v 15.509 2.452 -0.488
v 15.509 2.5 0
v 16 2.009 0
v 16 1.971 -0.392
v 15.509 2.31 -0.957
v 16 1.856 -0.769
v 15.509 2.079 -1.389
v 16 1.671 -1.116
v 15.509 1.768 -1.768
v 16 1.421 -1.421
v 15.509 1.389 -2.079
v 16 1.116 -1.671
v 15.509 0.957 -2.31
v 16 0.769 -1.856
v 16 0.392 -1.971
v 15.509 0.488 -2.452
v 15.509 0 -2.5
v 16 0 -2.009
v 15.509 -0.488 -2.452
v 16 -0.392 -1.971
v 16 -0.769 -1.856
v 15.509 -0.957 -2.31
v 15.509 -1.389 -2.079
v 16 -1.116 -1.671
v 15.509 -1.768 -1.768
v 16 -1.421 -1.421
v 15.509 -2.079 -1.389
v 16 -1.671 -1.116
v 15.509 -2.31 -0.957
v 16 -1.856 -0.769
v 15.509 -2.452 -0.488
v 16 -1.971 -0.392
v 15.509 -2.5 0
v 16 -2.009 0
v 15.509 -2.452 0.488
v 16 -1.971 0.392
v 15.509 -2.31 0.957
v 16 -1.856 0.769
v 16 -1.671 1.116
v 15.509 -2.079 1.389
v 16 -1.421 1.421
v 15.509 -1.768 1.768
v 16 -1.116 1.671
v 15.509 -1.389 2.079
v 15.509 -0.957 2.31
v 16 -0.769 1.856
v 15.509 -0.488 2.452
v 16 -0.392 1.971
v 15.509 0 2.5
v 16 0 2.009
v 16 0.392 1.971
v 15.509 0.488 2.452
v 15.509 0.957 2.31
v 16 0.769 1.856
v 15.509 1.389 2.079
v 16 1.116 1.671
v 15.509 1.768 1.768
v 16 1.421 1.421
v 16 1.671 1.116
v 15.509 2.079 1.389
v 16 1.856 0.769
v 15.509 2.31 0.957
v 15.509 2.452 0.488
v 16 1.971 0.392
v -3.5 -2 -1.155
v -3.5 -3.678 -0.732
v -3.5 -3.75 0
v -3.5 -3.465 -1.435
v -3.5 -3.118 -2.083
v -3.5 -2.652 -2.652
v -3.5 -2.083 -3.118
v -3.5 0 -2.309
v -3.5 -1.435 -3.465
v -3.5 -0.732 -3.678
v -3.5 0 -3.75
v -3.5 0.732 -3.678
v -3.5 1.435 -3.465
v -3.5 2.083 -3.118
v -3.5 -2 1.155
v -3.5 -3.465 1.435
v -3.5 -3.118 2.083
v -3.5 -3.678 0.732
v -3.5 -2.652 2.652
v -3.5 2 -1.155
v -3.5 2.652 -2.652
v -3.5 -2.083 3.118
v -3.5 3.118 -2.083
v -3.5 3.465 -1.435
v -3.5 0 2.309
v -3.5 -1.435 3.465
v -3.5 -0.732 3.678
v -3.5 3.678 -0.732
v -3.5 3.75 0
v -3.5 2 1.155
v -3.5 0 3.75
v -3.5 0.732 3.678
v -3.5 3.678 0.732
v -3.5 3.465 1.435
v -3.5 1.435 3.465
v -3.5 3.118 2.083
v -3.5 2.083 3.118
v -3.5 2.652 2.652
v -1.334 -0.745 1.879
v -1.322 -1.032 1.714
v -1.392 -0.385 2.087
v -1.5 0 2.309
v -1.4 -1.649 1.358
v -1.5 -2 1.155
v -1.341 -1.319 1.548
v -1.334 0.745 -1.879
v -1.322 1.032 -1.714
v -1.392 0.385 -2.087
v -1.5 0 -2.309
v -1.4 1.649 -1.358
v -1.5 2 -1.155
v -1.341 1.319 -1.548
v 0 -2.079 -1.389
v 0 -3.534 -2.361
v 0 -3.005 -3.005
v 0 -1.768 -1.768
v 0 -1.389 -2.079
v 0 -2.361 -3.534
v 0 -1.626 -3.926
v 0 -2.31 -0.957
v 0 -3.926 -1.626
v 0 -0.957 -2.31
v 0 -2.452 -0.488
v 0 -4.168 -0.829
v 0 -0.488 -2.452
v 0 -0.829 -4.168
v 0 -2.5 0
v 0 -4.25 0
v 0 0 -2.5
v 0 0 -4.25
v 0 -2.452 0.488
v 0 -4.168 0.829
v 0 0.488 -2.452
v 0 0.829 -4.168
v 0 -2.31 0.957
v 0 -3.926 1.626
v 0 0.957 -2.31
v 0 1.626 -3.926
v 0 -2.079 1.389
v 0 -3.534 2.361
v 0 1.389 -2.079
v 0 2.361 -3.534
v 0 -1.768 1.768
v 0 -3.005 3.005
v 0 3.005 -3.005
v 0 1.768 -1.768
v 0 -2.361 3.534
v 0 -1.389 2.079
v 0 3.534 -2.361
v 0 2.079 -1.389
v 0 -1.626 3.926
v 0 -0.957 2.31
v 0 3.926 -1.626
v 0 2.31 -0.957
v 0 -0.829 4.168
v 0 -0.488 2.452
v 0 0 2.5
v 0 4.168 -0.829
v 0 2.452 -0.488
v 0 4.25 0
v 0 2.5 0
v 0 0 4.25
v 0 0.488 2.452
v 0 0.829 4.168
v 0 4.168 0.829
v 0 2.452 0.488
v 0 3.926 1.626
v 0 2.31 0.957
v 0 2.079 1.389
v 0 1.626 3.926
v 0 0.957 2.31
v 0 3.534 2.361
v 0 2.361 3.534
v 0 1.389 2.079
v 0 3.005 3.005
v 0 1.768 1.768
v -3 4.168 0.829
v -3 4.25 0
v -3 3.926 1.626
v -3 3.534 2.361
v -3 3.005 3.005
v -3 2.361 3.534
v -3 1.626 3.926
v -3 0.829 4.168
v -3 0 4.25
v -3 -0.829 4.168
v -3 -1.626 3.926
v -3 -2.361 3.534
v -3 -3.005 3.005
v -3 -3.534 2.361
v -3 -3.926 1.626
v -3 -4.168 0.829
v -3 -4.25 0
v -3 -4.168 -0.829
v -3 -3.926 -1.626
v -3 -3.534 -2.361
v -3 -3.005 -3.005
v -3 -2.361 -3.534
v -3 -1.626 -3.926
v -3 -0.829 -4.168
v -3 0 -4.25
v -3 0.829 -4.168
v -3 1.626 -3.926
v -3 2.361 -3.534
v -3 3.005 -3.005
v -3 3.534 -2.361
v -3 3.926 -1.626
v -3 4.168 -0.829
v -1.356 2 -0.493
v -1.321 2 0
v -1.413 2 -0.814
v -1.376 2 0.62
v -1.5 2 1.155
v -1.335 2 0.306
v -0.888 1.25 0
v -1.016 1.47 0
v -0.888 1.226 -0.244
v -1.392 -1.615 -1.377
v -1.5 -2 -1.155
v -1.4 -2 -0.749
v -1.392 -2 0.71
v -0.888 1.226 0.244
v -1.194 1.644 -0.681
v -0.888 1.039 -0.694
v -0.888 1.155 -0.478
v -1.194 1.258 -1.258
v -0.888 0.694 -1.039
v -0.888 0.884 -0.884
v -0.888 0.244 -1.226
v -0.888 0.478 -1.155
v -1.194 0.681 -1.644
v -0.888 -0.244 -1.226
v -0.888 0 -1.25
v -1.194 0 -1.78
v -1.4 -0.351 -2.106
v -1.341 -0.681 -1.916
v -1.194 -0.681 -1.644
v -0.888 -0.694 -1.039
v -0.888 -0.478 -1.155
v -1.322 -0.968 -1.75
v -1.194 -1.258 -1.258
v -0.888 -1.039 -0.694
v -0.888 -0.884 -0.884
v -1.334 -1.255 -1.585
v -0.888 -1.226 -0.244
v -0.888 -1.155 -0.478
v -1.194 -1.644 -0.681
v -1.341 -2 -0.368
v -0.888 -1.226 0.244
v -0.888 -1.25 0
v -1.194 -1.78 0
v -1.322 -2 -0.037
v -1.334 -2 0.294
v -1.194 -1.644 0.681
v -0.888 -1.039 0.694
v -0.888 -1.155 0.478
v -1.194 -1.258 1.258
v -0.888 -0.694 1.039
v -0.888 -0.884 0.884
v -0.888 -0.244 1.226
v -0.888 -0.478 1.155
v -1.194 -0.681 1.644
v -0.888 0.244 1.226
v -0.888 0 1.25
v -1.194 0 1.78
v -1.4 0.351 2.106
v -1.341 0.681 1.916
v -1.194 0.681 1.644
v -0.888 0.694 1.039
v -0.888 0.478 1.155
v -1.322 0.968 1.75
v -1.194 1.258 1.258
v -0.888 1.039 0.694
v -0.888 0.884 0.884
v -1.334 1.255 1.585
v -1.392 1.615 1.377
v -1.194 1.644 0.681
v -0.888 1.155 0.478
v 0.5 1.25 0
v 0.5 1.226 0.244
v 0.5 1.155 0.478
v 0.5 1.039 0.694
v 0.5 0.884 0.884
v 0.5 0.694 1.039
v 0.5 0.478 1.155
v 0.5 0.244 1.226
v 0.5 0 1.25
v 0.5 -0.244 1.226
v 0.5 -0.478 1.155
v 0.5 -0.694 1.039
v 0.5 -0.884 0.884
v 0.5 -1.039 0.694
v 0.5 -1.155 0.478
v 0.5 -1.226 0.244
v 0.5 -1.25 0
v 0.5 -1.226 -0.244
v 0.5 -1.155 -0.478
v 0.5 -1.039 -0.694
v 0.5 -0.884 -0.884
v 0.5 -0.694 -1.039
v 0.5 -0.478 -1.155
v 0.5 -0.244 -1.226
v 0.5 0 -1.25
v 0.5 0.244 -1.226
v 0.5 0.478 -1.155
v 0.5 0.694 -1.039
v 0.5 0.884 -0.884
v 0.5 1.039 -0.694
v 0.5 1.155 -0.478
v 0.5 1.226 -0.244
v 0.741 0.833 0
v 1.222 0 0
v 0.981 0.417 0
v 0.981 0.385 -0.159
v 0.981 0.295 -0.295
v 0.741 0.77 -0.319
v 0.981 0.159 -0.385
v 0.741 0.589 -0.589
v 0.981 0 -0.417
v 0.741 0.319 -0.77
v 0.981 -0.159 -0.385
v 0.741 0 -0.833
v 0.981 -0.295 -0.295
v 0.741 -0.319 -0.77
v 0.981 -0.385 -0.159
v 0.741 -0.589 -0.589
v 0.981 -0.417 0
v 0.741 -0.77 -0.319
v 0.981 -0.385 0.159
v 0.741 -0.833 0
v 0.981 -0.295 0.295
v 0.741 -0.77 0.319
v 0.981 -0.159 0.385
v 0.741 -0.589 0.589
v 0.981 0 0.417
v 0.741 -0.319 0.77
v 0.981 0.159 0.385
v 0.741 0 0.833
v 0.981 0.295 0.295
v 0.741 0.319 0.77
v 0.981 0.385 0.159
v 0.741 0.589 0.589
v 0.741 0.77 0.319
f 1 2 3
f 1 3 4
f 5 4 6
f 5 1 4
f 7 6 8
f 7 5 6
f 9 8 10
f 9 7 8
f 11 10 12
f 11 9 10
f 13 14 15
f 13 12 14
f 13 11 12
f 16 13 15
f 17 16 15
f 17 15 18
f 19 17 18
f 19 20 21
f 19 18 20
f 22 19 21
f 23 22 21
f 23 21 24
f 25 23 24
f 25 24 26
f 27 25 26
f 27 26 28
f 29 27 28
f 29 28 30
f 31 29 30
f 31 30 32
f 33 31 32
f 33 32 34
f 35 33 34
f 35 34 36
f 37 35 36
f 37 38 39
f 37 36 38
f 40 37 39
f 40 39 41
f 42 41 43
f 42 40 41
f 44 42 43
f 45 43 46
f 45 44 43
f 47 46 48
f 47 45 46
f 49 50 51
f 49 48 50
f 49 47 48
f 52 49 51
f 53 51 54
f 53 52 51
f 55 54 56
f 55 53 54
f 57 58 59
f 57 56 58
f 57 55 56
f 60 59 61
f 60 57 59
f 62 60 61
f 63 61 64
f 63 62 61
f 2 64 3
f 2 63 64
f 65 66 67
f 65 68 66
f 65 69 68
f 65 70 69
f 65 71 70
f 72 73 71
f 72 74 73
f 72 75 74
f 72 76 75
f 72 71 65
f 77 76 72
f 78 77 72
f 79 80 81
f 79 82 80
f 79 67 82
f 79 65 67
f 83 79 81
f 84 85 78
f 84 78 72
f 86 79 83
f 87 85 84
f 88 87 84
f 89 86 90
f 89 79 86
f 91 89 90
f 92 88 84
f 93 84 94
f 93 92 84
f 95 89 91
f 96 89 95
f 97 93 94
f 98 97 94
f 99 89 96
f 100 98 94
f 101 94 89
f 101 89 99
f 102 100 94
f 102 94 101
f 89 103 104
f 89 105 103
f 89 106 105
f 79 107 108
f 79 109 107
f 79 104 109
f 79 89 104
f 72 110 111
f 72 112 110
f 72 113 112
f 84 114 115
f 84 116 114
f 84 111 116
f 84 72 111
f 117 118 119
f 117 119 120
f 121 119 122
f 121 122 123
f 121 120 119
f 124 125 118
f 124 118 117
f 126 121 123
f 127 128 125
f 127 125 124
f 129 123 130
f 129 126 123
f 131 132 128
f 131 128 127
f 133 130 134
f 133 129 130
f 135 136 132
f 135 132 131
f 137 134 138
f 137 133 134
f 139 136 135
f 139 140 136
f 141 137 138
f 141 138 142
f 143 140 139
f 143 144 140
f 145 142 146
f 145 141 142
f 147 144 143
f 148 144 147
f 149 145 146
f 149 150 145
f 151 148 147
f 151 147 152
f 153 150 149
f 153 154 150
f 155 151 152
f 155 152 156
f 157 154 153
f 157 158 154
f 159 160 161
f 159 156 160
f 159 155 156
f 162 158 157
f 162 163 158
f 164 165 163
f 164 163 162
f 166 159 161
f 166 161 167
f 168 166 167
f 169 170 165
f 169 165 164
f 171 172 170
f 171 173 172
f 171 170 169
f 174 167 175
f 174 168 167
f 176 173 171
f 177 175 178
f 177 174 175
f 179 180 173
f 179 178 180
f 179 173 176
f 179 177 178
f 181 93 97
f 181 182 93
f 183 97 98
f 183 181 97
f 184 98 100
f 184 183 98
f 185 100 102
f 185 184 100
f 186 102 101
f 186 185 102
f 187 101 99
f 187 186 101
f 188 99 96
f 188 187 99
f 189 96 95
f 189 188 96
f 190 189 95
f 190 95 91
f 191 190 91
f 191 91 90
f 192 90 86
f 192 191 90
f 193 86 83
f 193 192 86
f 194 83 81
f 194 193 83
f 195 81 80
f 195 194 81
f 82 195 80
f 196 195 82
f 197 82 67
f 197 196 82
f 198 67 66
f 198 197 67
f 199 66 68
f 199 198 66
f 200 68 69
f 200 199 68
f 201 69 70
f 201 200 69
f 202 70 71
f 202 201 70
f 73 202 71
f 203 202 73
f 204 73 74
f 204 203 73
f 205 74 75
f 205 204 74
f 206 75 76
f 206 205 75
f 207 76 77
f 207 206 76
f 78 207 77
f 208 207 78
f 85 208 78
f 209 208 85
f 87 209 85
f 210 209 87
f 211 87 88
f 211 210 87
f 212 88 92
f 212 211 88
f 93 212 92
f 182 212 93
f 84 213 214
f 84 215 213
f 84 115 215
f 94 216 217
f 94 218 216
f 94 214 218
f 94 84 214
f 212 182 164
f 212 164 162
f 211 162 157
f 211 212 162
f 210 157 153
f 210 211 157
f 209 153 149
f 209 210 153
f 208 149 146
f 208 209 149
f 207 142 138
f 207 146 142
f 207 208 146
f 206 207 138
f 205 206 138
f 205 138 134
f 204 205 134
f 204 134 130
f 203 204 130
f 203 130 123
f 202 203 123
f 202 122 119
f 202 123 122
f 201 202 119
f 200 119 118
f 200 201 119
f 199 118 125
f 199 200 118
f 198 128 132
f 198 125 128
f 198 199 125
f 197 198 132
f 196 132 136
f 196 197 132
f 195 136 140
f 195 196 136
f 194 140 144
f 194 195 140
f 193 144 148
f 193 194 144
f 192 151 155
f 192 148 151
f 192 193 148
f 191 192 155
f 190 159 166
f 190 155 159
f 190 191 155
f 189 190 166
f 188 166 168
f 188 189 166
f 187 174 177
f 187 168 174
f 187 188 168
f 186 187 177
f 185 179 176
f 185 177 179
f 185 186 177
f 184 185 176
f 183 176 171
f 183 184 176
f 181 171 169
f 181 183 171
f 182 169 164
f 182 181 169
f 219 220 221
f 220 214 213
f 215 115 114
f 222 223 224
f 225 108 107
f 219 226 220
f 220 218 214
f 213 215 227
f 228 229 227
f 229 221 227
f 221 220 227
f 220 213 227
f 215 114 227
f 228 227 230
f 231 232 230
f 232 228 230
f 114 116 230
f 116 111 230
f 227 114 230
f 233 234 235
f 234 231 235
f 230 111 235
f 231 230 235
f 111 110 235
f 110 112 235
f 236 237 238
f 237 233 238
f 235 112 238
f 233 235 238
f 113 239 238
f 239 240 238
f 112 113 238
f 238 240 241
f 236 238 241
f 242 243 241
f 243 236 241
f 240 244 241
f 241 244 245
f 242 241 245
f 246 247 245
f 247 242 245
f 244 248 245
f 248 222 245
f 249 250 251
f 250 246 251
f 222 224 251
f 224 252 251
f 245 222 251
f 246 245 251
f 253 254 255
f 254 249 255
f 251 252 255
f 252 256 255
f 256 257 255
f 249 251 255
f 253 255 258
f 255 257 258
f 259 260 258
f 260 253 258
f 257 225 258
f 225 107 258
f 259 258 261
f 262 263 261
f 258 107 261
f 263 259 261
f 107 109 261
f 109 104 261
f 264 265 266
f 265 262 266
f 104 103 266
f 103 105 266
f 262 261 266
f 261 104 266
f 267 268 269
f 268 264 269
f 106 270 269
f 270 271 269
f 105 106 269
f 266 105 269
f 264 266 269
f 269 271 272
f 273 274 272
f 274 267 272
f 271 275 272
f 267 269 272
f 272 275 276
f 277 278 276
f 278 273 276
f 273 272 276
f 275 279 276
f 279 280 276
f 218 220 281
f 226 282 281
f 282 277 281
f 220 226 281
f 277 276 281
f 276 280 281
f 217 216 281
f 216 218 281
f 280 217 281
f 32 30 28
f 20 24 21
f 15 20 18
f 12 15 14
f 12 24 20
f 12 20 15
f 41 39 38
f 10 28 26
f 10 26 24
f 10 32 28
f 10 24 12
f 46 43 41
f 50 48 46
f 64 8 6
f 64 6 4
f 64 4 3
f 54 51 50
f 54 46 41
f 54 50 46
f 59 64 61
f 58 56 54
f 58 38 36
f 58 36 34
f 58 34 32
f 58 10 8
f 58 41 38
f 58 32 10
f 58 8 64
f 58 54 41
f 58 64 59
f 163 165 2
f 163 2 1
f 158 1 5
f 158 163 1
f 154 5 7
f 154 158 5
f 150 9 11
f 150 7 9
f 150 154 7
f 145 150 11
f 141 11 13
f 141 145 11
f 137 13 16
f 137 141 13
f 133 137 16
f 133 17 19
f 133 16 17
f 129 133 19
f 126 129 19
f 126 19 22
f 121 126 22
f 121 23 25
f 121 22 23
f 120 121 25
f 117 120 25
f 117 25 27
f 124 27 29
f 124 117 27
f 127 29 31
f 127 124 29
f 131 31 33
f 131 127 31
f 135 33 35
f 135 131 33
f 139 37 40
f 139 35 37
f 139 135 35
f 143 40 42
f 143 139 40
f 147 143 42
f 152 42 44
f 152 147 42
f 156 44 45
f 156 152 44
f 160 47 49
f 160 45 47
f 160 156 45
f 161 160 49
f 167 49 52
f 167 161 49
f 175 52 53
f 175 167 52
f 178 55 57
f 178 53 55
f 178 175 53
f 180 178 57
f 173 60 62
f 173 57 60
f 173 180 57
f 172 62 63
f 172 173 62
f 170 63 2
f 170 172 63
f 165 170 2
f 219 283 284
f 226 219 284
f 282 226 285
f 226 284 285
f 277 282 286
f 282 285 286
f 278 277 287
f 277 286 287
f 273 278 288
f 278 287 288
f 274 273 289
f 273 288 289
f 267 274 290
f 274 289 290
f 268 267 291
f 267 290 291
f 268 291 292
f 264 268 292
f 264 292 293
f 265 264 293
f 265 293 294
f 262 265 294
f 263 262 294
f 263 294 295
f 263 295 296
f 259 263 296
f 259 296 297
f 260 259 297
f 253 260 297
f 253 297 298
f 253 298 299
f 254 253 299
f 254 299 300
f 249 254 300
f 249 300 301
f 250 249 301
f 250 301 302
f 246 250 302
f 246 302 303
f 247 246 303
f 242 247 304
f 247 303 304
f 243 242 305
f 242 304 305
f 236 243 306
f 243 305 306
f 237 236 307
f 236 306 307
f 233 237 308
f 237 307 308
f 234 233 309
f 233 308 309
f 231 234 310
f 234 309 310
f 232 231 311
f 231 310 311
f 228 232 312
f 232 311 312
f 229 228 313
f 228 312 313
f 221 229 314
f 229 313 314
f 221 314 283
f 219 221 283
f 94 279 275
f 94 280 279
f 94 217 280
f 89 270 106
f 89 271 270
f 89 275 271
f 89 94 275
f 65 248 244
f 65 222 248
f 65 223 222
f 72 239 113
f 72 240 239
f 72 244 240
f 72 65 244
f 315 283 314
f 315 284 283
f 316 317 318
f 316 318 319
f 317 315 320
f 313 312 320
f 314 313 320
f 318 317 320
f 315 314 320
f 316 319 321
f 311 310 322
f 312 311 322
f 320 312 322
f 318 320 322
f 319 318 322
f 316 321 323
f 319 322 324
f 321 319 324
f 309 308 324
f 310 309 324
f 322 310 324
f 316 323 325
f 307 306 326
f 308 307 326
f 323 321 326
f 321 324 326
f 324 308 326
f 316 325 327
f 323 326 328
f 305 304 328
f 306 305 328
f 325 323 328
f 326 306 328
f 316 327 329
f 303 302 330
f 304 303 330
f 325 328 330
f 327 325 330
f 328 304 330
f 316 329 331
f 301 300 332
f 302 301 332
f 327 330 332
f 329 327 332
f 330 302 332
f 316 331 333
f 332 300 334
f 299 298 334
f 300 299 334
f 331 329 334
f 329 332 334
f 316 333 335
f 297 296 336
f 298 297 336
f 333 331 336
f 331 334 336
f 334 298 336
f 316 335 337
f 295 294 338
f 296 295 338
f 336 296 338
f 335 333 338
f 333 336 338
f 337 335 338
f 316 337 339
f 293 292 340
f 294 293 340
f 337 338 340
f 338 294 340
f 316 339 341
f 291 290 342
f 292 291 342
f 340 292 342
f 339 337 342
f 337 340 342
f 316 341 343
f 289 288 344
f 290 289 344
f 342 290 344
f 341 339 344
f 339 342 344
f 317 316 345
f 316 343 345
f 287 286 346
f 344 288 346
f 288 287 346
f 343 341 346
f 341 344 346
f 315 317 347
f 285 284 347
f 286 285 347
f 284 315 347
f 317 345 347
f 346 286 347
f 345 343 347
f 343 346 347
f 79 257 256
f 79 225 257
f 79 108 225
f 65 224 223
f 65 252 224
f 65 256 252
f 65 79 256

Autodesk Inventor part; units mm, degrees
ref_plane "YZ Plane" through (0, 0, 0) normal (1, 0, 0) x (0, 1, 0)
ref_plane "XZ Plane" through (0, 0, 0) normal (0, 1, 0) x (-1, 0, 0)
sketch "Sketch1" plane through (0, 0, 0) normal (0, 0, 1) x (1, 0, 0)
  line L0 (1.2217, 0) -> (16, 0)
  line L1 (16, 0) -> (16, 2.5)
  line L2 (16, 2.5) -> (0, 2.5)
  line L3 (0, 2.5) -> (0, 4.25)
  line L4 (0, 4.25) -> (-3.5, 4.25)
  line L5 (-3.5, 4.25) -> (-3.5, 2.3094)
  line L6 (-3.5, 2.3094) -> (-1.5, 2.3094)
  line L7 (-1.5, 2.3094) -> (-0.8884, 1.25)
  line L8 (-7.4, 0) -> (19.9, 0) projected
  line L9 (0, -0.85) -> (0, 5.1) projected
  line L10 (-0.8884, 1.25) -> (0.5, 1.25)
  line L11 (0.5, 1.25) -> (1.2217, 0)
  line L12 (-3.5, 2.3094) -> (-3.5, 0) construction
  line L13 (-3.5, 3.75) -> (-3, 4.25)
  dimension "d0" = 3.5
  dimension "d1" = 2
  dimension "d2" = 60
  dimension "d3" = 5
  dimension "d4" = 4.6188
  dimension "d5" = 8.5
  dimension "d15" = 4
  dimension "d16" = 2.5
  dimension "d17" = 16
  dimension "d32" = 45
  dimension "d33" = 0.5
revolve "Body" add sketch "Sketch1" angle 360 about axis through (1.2217, 0, 0) along (1, 0, 0) contours L11 L10 L9 L2 L1 L0 | L10 L7 L6 L5 L13 L4 L3 L9 | L13 L5 L4
revolve "Chamfer2" cut sketch "Sketch1" angle 360 about axis through (-10, 0, 0) along (1, 0, 0) contours L13 L5 L4
sketch "Sketch2" plane through (-3.5, 0, 0) normal (-1, 0, 0) x (0, 0, 1)
  circle A0 centre (0, 0) radius 2.3094 projected
  line L0 (0, -5.95) -> (0, 5.95) projected
  line L1 (-5.95, 0) -> (5.95, 0) projected
  line L2 (2.3094, 0) -> (1.1547, -2)
  line L3 (1.1547, -2) -> (-1.1547, -2)
  line L4 (-1.1547, -2) -> (-2.3094, 0)
  line L5 (-2.3094, 0) -> (-1.1547, 2)
  line L6 (-1.1547, 2) -> (1.1547, 2)
  line L7 (1.1547, 2) -> (2.3094, 0)
extrude "Slot" add sketch "Sketch2" against normal up to next contours L7 A0 | A0 L2 | L6 L0 A0 | A0 L0 L3 | L0 L6 A0 | A0 L3 L0 | L4 A0 | A0 L5
thread "Thread" size "M5x0.8" class "6g" standard "ISO Metric profile" length 11.8
chamfer "Chamfer1" distance 0.4908 distance2 0.4908 1 edges at (16, -2.5, 0) measured on face at (16, -1.1374, -1.1324)
ref_plane "Work Plane1" through (8, 0, 0) normal (0, 0.5, 0.866) x (1, 0, 0)
equation "\"d0\" = KOH"
equation "\"d1\" = INTI"
equation "\"d3\" = GD"
equation "\"d4\" = 1.1547 * SW"
equation "\"d5\" = KOD"
equation "\"d15\" = INFT"
equation "\"d16\" = SDT"
equation "\"d17\" = NLG"
equation "\"d33\" = Cham"
equation "\"d7\" = GEL"
equation "\"d9\" = -0.5 * SPD + 0.5 * GD"
equation "\"d12\" = GUL"
equation "\"GD\" = NND"
equation "\"NLG\" = 16"
equation "\"GEL\" = 11.8"
equation "\"KOD\" = 8.5"
equation "\"KOH\" = 3.5"
equation "\"GUL\" = 0.61345 * PTC"
equation "\"SW\" = 4"
equation "\"INTI\" = 2"
equation "\"SPD\" = NND - 1.2269 * PTC"
equation "\"SDT\" = 2.5"
equation "\"INFT\" = 4"
equation "\"Cham\" = 0.5"
equation "\"TOA\" = 30deg"
equation "\"GD1\" = THREADDIA - 1.2269 * PTC"
equation "\"THREADDIA\" = 5"
equation "\"BDM\" = NND"
equation "\"FAWI\" = 45deg"
equation "\"RR\" = 0.1 * NND"
equation "\"PTC\" = 0.8"
equation "\"NND\" = 5"
equation "\"FAWI1\" = 45deg"
equation "\"GAL\" = 0.61345 * PTC"
equation "\"E0\" = 1.155 * SW"
properties part number "DIN 6912 - M5 x 16" material "Steel, Mild"
